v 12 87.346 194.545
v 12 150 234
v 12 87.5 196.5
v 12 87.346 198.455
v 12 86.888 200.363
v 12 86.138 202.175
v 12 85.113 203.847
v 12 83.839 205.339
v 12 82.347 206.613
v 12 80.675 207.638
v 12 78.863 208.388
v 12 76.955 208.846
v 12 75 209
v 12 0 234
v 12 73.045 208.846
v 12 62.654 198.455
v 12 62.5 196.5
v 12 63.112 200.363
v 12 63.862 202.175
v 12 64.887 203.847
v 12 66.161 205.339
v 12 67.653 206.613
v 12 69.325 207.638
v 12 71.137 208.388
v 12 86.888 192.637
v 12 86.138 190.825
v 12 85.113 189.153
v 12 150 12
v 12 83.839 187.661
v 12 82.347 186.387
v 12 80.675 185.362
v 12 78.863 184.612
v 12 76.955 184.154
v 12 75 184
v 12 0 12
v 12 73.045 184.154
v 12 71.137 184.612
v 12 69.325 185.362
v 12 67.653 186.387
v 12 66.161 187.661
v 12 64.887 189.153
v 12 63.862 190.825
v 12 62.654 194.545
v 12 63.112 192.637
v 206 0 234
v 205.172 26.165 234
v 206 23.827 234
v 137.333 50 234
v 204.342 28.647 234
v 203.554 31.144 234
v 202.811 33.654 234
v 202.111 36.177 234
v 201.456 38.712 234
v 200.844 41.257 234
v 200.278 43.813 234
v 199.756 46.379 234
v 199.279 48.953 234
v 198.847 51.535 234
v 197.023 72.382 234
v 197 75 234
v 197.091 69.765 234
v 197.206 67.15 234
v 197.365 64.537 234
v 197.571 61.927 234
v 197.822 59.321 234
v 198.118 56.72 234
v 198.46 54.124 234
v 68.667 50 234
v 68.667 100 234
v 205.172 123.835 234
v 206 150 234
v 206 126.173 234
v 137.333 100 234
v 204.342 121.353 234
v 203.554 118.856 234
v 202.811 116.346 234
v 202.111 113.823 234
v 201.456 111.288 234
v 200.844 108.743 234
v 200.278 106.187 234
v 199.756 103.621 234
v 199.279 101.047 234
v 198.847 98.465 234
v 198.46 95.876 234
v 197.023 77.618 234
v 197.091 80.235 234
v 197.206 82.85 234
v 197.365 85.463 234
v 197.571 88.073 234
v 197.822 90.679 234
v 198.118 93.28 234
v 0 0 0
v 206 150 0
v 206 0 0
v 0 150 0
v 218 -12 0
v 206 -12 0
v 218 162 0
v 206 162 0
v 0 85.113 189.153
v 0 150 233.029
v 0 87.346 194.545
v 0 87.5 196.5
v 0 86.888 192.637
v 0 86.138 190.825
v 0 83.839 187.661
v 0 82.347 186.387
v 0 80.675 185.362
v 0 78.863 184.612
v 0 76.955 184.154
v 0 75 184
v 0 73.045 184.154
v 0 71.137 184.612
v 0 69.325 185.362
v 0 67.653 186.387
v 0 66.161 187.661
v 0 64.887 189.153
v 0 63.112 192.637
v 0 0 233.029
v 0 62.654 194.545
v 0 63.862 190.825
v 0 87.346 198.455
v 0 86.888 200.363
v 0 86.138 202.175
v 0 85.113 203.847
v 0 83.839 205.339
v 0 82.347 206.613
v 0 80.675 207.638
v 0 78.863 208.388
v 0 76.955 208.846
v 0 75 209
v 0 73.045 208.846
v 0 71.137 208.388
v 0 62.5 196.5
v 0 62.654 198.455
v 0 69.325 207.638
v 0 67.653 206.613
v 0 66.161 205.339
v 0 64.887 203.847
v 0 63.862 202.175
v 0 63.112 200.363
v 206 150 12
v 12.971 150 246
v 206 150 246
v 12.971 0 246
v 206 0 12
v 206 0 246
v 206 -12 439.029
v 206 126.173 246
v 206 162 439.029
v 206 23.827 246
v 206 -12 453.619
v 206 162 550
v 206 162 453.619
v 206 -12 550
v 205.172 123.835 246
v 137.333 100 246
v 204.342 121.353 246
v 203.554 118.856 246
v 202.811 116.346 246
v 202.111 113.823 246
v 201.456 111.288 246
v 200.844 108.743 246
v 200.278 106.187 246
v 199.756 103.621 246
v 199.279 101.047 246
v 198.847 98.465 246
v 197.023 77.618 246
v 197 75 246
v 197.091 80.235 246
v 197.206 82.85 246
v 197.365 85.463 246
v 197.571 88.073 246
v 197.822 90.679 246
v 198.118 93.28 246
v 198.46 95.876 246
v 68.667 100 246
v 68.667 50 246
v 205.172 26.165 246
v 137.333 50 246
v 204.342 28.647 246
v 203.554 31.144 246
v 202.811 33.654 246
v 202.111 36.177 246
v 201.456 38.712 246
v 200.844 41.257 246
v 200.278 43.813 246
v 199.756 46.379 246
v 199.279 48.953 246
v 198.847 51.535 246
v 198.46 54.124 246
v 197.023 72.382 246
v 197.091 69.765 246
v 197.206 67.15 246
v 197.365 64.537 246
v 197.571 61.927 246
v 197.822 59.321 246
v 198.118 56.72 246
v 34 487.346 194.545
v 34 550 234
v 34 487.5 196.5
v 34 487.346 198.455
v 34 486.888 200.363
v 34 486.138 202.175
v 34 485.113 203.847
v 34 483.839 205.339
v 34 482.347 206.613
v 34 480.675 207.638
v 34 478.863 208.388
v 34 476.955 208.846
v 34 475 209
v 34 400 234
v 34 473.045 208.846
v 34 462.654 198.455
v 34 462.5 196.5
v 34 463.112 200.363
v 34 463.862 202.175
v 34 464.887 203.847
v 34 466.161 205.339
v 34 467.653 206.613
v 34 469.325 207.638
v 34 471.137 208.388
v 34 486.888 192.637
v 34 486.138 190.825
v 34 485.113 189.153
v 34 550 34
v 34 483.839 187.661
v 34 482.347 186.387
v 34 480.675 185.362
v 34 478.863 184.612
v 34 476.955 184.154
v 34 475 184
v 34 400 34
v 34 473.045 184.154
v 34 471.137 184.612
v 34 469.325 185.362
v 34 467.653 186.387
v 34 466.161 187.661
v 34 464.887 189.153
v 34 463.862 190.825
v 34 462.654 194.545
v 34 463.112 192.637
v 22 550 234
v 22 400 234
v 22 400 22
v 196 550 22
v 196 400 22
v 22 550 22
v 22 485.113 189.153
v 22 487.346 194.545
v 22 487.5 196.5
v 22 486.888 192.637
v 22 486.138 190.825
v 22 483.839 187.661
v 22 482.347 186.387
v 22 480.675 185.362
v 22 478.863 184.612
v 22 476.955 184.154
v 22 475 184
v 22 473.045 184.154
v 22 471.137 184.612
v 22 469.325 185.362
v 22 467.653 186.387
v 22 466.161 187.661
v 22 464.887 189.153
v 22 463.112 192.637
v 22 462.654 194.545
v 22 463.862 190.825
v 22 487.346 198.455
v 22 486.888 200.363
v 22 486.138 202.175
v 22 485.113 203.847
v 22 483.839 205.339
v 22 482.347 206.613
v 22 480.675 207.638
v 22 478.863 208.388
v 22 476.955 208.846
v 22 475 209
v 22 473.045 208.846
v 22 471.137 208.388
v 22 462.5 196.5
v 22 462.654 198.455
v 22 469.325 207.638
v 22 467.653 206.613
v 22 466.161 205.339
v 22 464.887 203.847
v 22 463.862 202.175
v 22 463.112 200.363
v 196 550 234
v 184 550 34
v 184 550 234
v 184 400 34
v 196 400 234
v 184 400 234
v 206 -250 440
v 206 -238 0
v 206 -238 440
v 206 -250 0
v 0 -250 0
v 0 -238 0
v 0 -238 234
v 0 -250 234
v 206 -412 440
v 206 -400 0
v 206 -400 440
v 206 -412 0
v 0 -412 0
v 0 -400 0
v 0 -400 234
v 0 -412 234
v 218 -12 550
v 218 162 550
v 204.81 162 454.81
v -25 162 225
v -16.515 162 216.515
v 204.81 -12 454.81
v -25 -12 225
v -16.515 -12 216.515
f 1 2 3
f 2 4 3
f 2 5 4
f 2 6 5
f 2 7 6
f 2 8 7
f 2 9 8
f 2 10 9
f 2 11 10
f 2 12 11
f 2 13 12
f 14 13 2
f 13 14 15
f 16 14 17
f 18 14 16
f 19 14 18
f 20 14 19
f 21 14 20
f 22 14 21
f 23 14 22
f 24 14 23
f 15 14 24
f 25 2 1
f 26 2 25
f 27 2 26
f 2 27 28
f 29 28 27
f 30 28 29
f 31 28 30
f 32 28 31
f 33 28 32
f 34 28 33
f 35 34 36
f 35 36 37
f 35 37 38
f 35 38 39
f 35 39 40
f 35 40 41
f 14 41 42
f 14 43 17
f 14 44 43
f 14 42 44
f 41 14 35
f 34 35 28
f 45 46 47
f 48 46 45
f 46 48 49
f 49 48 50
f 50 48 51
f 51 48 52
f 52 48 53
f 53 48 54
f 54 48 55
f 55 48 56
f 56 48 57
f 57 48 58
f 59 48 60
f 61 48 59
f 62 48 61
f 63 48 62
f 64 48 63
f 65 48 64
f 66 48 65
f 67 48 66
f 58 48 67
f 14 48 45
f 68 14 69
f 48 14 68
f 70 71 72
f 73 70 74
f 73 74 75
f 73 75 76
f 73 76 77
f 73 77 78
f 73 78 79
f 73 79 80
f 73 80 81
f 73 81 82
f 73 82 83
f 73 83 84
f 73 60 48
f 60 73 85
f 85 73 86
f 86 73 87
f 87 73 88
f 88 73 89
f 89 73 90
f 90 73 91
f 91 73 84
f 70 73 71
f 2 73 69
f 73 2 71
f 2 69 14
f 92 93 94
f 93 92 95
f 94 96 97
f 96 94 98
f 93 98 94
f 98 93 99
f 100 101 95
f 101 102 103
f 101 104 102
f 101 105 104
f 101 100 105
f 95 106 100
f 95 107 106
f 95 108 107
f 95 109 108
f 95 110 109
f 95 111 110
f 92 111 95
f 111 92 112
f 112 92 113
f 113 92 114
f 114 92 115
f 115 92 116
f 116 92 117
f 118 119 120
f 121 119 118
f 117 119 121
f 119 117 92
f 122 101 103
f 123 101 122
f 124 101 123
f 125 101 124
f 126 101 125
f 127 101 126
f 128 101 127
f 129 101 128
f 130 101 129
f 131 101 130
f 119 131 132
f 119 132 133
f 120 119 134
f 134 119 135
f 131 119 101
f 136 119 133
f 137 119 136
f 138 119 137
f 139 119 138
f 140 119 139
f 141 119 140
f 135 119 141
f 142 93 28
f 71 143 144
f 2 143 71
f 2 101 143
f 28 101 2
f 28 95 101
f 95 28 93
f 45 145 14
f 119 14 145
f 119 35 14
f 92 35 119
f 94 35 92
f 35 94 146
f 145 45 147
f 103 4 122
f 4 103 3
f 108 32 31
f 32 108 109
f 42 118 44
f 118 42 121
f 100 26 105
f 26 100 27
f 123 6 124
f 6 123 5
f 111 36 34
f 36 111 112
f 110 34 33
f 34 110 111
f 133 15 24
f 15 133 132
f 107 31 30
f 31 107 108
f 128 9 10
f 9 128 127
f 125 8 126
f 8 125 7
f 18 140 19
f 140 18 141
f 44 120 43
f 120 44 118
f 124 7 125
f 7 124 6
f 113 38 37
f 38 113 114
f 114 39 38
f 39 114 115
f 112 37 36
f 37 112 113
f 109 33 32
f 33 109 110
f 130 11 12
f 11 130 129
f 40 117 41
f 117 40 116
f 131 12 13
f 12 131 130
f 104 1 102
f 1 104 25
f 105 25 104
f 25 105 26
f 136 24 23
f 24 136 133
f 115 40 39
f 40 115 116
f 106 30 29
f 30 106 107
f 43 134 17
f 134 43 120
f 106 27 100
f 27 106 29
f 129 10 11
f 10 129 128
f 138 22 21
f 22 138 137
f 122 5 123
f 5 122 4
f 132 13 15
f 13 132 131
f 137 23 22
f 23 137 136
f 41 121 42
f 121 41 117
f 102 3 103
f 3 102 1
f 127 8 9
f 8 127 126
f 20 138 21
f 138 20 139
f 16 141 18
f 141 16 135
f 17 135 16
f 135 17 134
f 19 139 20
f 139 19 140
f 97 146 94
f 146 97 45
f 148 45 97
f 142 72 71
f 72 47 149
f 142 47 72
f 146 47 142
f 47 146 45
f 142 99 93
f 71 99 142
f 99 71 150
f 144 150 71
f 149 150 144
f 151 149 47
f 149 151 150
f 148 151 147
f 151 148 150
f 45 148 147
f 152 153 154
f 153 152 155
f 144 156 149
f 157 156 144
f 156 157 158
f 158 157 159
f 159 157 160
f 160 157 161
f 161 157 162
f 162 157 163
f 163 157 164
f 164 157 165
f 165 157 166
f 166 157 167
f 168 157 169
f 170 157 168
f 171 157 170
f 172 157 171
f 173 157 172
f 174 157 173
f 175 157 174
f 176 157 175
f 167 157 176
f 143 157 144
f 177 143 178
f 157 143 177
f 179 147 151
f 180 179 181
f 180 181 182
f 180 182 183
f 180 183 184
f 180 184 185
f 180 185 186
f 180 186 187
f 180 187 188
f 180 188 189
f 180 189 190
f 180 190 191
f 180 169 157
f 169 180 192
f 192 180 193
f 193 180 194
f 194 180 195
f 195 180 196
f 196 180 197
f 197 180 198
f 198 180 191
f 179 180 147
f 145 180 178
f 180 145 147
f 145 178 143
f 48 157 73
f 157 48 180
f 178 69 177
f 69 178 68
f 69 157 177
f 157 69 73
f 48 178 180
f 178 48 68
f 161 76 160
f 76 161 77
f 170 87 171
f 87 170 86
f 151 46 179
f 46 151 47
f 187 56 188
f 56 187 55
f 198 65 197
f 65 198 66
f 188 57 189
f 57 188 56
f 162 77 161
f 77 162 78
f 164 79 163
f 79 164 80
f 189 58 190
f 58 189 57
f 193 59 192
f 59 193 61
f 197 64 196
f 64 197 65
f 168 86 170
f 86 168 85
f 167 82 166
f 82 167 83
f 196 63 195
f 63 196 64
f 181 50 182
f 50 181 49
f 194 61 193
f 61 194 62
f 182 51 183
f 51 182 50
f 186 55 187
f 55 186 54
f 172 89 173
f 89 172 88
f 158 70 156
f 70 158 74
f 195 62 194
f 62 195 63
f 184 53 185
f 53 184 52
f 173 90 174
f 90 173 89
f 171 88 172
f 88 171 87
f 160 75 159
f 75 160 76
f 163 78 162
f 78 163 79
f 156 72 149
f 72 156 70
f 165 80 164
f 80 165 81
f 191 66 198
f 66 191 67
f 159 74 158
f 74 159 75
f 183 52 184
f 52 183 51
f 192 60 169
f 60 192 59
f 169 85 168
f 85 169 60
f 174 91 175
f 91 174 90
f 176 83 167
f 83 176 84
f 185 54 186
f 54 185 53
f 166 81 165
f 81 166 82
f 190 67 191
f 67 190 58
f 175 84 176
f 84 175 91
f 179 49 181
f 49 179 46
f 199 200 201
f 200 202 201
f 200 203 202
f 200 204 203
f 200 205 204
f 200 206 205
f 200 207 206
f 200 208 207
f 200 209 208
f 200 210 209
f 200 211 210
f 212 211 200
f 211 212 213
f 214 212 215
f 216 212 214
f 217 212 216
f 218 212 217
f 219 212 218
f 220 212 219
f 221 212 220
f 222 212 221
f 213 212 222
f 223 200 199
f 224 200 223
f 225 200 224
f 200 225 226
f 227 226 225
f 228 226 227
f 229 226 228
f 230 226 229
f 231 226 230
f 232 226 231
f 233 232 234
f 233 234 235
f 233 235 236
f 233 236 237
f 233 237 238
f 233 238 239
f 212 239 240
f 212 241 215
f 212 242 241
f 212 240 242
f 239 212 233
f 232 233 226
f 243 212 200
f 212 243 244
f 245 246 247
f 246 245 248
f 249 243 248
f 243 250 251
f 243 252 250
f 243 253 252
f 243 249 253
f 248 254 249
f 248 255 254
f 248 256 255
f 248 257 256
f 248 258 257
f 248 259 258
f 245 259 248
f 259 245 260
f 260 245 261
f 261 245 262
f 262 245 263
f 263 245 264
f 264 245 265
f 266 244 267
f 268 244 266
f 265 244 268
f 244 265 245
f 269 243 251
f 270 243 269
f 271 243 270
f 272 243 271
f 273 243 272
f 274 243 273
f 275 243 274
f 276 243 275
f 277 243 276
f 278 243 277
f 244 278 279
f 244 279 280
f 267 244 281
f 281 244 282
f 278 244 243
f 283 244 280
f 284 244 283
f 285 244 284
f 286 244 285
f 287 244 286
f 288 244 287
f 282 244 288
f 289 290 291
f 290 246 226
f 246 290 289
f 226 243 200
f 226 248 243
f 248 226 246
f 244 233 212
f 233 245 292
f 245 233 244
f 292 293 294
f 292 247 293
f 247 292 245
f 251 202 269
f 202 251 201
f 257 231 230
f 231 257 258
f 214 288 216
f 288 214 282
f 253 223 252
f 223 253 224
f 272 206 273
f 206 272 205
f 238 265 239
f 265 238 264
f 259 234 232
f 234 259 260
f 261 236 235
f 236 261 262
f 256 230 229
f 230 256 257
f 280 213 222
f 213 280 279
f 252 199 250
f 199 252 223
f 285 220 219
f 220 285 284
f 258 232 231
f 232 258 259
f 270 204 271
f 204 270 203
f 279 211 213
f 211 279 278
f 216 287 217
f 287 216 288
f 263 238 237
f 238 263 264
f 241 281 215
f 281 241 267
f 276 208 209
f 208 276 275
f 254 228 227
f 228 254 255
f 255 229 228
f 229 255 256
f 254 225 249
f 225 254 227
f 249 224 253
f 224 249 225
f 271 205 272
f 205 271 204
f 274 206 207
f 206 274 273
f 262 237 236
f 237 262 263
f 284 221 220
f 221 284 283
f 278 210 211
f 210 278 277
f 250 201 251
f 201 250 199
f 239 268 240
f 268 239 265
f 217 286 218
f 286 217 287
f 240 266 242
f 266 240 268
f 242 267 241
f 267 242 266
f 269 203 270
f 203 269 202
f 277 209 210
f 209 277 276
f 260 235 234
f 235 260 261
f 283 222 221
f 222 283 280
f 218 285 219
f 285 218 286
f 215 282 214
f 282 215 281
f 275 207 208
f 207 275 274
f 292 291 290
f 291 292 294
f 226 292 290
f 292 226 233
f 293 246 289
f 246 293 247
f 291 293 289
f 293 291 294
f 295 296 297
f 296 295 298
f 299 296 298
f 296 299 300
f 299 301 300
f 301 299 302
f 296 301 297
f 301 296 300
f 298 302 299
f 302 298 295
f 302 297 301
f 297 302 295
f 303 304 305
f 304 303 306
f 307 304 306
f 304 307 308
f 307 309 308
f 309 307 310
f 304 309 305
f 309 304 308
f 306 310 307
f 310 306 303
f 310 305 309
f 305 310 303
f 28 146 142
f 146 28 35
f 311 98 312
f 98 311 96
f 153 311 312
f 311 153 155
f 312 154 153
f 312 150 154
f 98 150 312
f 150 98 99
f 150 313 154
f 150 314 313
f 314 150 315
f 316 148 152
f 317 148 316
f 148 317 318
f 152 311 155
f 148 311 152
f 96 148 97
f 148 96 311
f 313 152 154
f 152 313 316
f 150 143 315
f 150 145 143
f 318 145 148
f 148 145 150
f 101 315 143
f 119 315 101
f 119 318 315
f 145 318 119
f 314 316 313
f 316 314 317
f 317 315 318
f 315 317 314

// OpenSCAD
//bottom plank (red)
color([1, 0, 0]) translate([12, 0, 0]) cube([194, 150, 12]);

//back plank (blue)
color([0, 0, 1]) translate([206, -12, 0]) cube([12, 174, 550]);

difference() {
	//front plank (green)
	color([0, 1, 0]) cube([12, 150, 234]);
	//hole
	translate([-10, 75, 196.5]) rotate(90, [0, 1, 0])
	    cylinder(44, 12.5, 12.5, false, $fa=1);
};

difference() {
    //top plank (red)
    color([1, 0, 0]) translate([0, 0, 234]) cube([206, 150, 12]);
    //window (perspex)
    translate([206/3, 150/3, 233]) cube([206/3, 50, 14]);
    //cable cut-out
    translate([347, 75, 233]) cylinder(44, 150, 150, center=true, $fa=1);
    
};

//top plank (yellow)
color([1,1,0]) translate([-25, -12, 225]) rotate(45, [0,1,0]) cube([12, 174, 325]);

//bird section
//translate([0, 0, 0]) // UNEXPLODED
translate([0, 400, 0]) // EXPLODED
{   
    //bottom plank (yellow)
    translate([34, 0, 22]) cube([150, 150, 12]);
    
    //back plank (green) 
    color("purple") translate([184, 0, 22]) cube([12, 150, 212]);
    
    difference() {
	//front plank (blue)
	color([0, 0, 1]) translate([22, 0, 22]) cube([12, 150, 212]);
	//hole
	translate([-10, 75, 196.5]) rotate(90, [0, 1, 0])
	    cylinder(49, 12.5, 12.5, false, $fa=1);
    };
};

//side planks (turquoise)
color([0, 1, 1])
//translate([0, 0, 0]) // UNEXPLODED
translate([0, -400, 0]) // EXPLODED
{
    //left side (from front)
    translate([0, 150, 0]) {
        //square section
        cube([206, 12, 234]);
        
        //triangle section
        translate([0, 12, 234])
        rotate(90, [1, 0, 0])
        linear_extrude(height = 12)
        polygon([[0, 0], [206, 0], [206, 206]]);
        
    }
    
    //right side (from front)
    translate([0, -12, 0]) {
        //square section
        cube([206, 12, 234]);
        
        //triangle section
        translate([0, 12, 234])
        rotate(90, [1, 0, 0])
        linear_extrude(height = 12)
        polygon([[0, 0], [206, 0], [206, 206]]);
    }
    
};
